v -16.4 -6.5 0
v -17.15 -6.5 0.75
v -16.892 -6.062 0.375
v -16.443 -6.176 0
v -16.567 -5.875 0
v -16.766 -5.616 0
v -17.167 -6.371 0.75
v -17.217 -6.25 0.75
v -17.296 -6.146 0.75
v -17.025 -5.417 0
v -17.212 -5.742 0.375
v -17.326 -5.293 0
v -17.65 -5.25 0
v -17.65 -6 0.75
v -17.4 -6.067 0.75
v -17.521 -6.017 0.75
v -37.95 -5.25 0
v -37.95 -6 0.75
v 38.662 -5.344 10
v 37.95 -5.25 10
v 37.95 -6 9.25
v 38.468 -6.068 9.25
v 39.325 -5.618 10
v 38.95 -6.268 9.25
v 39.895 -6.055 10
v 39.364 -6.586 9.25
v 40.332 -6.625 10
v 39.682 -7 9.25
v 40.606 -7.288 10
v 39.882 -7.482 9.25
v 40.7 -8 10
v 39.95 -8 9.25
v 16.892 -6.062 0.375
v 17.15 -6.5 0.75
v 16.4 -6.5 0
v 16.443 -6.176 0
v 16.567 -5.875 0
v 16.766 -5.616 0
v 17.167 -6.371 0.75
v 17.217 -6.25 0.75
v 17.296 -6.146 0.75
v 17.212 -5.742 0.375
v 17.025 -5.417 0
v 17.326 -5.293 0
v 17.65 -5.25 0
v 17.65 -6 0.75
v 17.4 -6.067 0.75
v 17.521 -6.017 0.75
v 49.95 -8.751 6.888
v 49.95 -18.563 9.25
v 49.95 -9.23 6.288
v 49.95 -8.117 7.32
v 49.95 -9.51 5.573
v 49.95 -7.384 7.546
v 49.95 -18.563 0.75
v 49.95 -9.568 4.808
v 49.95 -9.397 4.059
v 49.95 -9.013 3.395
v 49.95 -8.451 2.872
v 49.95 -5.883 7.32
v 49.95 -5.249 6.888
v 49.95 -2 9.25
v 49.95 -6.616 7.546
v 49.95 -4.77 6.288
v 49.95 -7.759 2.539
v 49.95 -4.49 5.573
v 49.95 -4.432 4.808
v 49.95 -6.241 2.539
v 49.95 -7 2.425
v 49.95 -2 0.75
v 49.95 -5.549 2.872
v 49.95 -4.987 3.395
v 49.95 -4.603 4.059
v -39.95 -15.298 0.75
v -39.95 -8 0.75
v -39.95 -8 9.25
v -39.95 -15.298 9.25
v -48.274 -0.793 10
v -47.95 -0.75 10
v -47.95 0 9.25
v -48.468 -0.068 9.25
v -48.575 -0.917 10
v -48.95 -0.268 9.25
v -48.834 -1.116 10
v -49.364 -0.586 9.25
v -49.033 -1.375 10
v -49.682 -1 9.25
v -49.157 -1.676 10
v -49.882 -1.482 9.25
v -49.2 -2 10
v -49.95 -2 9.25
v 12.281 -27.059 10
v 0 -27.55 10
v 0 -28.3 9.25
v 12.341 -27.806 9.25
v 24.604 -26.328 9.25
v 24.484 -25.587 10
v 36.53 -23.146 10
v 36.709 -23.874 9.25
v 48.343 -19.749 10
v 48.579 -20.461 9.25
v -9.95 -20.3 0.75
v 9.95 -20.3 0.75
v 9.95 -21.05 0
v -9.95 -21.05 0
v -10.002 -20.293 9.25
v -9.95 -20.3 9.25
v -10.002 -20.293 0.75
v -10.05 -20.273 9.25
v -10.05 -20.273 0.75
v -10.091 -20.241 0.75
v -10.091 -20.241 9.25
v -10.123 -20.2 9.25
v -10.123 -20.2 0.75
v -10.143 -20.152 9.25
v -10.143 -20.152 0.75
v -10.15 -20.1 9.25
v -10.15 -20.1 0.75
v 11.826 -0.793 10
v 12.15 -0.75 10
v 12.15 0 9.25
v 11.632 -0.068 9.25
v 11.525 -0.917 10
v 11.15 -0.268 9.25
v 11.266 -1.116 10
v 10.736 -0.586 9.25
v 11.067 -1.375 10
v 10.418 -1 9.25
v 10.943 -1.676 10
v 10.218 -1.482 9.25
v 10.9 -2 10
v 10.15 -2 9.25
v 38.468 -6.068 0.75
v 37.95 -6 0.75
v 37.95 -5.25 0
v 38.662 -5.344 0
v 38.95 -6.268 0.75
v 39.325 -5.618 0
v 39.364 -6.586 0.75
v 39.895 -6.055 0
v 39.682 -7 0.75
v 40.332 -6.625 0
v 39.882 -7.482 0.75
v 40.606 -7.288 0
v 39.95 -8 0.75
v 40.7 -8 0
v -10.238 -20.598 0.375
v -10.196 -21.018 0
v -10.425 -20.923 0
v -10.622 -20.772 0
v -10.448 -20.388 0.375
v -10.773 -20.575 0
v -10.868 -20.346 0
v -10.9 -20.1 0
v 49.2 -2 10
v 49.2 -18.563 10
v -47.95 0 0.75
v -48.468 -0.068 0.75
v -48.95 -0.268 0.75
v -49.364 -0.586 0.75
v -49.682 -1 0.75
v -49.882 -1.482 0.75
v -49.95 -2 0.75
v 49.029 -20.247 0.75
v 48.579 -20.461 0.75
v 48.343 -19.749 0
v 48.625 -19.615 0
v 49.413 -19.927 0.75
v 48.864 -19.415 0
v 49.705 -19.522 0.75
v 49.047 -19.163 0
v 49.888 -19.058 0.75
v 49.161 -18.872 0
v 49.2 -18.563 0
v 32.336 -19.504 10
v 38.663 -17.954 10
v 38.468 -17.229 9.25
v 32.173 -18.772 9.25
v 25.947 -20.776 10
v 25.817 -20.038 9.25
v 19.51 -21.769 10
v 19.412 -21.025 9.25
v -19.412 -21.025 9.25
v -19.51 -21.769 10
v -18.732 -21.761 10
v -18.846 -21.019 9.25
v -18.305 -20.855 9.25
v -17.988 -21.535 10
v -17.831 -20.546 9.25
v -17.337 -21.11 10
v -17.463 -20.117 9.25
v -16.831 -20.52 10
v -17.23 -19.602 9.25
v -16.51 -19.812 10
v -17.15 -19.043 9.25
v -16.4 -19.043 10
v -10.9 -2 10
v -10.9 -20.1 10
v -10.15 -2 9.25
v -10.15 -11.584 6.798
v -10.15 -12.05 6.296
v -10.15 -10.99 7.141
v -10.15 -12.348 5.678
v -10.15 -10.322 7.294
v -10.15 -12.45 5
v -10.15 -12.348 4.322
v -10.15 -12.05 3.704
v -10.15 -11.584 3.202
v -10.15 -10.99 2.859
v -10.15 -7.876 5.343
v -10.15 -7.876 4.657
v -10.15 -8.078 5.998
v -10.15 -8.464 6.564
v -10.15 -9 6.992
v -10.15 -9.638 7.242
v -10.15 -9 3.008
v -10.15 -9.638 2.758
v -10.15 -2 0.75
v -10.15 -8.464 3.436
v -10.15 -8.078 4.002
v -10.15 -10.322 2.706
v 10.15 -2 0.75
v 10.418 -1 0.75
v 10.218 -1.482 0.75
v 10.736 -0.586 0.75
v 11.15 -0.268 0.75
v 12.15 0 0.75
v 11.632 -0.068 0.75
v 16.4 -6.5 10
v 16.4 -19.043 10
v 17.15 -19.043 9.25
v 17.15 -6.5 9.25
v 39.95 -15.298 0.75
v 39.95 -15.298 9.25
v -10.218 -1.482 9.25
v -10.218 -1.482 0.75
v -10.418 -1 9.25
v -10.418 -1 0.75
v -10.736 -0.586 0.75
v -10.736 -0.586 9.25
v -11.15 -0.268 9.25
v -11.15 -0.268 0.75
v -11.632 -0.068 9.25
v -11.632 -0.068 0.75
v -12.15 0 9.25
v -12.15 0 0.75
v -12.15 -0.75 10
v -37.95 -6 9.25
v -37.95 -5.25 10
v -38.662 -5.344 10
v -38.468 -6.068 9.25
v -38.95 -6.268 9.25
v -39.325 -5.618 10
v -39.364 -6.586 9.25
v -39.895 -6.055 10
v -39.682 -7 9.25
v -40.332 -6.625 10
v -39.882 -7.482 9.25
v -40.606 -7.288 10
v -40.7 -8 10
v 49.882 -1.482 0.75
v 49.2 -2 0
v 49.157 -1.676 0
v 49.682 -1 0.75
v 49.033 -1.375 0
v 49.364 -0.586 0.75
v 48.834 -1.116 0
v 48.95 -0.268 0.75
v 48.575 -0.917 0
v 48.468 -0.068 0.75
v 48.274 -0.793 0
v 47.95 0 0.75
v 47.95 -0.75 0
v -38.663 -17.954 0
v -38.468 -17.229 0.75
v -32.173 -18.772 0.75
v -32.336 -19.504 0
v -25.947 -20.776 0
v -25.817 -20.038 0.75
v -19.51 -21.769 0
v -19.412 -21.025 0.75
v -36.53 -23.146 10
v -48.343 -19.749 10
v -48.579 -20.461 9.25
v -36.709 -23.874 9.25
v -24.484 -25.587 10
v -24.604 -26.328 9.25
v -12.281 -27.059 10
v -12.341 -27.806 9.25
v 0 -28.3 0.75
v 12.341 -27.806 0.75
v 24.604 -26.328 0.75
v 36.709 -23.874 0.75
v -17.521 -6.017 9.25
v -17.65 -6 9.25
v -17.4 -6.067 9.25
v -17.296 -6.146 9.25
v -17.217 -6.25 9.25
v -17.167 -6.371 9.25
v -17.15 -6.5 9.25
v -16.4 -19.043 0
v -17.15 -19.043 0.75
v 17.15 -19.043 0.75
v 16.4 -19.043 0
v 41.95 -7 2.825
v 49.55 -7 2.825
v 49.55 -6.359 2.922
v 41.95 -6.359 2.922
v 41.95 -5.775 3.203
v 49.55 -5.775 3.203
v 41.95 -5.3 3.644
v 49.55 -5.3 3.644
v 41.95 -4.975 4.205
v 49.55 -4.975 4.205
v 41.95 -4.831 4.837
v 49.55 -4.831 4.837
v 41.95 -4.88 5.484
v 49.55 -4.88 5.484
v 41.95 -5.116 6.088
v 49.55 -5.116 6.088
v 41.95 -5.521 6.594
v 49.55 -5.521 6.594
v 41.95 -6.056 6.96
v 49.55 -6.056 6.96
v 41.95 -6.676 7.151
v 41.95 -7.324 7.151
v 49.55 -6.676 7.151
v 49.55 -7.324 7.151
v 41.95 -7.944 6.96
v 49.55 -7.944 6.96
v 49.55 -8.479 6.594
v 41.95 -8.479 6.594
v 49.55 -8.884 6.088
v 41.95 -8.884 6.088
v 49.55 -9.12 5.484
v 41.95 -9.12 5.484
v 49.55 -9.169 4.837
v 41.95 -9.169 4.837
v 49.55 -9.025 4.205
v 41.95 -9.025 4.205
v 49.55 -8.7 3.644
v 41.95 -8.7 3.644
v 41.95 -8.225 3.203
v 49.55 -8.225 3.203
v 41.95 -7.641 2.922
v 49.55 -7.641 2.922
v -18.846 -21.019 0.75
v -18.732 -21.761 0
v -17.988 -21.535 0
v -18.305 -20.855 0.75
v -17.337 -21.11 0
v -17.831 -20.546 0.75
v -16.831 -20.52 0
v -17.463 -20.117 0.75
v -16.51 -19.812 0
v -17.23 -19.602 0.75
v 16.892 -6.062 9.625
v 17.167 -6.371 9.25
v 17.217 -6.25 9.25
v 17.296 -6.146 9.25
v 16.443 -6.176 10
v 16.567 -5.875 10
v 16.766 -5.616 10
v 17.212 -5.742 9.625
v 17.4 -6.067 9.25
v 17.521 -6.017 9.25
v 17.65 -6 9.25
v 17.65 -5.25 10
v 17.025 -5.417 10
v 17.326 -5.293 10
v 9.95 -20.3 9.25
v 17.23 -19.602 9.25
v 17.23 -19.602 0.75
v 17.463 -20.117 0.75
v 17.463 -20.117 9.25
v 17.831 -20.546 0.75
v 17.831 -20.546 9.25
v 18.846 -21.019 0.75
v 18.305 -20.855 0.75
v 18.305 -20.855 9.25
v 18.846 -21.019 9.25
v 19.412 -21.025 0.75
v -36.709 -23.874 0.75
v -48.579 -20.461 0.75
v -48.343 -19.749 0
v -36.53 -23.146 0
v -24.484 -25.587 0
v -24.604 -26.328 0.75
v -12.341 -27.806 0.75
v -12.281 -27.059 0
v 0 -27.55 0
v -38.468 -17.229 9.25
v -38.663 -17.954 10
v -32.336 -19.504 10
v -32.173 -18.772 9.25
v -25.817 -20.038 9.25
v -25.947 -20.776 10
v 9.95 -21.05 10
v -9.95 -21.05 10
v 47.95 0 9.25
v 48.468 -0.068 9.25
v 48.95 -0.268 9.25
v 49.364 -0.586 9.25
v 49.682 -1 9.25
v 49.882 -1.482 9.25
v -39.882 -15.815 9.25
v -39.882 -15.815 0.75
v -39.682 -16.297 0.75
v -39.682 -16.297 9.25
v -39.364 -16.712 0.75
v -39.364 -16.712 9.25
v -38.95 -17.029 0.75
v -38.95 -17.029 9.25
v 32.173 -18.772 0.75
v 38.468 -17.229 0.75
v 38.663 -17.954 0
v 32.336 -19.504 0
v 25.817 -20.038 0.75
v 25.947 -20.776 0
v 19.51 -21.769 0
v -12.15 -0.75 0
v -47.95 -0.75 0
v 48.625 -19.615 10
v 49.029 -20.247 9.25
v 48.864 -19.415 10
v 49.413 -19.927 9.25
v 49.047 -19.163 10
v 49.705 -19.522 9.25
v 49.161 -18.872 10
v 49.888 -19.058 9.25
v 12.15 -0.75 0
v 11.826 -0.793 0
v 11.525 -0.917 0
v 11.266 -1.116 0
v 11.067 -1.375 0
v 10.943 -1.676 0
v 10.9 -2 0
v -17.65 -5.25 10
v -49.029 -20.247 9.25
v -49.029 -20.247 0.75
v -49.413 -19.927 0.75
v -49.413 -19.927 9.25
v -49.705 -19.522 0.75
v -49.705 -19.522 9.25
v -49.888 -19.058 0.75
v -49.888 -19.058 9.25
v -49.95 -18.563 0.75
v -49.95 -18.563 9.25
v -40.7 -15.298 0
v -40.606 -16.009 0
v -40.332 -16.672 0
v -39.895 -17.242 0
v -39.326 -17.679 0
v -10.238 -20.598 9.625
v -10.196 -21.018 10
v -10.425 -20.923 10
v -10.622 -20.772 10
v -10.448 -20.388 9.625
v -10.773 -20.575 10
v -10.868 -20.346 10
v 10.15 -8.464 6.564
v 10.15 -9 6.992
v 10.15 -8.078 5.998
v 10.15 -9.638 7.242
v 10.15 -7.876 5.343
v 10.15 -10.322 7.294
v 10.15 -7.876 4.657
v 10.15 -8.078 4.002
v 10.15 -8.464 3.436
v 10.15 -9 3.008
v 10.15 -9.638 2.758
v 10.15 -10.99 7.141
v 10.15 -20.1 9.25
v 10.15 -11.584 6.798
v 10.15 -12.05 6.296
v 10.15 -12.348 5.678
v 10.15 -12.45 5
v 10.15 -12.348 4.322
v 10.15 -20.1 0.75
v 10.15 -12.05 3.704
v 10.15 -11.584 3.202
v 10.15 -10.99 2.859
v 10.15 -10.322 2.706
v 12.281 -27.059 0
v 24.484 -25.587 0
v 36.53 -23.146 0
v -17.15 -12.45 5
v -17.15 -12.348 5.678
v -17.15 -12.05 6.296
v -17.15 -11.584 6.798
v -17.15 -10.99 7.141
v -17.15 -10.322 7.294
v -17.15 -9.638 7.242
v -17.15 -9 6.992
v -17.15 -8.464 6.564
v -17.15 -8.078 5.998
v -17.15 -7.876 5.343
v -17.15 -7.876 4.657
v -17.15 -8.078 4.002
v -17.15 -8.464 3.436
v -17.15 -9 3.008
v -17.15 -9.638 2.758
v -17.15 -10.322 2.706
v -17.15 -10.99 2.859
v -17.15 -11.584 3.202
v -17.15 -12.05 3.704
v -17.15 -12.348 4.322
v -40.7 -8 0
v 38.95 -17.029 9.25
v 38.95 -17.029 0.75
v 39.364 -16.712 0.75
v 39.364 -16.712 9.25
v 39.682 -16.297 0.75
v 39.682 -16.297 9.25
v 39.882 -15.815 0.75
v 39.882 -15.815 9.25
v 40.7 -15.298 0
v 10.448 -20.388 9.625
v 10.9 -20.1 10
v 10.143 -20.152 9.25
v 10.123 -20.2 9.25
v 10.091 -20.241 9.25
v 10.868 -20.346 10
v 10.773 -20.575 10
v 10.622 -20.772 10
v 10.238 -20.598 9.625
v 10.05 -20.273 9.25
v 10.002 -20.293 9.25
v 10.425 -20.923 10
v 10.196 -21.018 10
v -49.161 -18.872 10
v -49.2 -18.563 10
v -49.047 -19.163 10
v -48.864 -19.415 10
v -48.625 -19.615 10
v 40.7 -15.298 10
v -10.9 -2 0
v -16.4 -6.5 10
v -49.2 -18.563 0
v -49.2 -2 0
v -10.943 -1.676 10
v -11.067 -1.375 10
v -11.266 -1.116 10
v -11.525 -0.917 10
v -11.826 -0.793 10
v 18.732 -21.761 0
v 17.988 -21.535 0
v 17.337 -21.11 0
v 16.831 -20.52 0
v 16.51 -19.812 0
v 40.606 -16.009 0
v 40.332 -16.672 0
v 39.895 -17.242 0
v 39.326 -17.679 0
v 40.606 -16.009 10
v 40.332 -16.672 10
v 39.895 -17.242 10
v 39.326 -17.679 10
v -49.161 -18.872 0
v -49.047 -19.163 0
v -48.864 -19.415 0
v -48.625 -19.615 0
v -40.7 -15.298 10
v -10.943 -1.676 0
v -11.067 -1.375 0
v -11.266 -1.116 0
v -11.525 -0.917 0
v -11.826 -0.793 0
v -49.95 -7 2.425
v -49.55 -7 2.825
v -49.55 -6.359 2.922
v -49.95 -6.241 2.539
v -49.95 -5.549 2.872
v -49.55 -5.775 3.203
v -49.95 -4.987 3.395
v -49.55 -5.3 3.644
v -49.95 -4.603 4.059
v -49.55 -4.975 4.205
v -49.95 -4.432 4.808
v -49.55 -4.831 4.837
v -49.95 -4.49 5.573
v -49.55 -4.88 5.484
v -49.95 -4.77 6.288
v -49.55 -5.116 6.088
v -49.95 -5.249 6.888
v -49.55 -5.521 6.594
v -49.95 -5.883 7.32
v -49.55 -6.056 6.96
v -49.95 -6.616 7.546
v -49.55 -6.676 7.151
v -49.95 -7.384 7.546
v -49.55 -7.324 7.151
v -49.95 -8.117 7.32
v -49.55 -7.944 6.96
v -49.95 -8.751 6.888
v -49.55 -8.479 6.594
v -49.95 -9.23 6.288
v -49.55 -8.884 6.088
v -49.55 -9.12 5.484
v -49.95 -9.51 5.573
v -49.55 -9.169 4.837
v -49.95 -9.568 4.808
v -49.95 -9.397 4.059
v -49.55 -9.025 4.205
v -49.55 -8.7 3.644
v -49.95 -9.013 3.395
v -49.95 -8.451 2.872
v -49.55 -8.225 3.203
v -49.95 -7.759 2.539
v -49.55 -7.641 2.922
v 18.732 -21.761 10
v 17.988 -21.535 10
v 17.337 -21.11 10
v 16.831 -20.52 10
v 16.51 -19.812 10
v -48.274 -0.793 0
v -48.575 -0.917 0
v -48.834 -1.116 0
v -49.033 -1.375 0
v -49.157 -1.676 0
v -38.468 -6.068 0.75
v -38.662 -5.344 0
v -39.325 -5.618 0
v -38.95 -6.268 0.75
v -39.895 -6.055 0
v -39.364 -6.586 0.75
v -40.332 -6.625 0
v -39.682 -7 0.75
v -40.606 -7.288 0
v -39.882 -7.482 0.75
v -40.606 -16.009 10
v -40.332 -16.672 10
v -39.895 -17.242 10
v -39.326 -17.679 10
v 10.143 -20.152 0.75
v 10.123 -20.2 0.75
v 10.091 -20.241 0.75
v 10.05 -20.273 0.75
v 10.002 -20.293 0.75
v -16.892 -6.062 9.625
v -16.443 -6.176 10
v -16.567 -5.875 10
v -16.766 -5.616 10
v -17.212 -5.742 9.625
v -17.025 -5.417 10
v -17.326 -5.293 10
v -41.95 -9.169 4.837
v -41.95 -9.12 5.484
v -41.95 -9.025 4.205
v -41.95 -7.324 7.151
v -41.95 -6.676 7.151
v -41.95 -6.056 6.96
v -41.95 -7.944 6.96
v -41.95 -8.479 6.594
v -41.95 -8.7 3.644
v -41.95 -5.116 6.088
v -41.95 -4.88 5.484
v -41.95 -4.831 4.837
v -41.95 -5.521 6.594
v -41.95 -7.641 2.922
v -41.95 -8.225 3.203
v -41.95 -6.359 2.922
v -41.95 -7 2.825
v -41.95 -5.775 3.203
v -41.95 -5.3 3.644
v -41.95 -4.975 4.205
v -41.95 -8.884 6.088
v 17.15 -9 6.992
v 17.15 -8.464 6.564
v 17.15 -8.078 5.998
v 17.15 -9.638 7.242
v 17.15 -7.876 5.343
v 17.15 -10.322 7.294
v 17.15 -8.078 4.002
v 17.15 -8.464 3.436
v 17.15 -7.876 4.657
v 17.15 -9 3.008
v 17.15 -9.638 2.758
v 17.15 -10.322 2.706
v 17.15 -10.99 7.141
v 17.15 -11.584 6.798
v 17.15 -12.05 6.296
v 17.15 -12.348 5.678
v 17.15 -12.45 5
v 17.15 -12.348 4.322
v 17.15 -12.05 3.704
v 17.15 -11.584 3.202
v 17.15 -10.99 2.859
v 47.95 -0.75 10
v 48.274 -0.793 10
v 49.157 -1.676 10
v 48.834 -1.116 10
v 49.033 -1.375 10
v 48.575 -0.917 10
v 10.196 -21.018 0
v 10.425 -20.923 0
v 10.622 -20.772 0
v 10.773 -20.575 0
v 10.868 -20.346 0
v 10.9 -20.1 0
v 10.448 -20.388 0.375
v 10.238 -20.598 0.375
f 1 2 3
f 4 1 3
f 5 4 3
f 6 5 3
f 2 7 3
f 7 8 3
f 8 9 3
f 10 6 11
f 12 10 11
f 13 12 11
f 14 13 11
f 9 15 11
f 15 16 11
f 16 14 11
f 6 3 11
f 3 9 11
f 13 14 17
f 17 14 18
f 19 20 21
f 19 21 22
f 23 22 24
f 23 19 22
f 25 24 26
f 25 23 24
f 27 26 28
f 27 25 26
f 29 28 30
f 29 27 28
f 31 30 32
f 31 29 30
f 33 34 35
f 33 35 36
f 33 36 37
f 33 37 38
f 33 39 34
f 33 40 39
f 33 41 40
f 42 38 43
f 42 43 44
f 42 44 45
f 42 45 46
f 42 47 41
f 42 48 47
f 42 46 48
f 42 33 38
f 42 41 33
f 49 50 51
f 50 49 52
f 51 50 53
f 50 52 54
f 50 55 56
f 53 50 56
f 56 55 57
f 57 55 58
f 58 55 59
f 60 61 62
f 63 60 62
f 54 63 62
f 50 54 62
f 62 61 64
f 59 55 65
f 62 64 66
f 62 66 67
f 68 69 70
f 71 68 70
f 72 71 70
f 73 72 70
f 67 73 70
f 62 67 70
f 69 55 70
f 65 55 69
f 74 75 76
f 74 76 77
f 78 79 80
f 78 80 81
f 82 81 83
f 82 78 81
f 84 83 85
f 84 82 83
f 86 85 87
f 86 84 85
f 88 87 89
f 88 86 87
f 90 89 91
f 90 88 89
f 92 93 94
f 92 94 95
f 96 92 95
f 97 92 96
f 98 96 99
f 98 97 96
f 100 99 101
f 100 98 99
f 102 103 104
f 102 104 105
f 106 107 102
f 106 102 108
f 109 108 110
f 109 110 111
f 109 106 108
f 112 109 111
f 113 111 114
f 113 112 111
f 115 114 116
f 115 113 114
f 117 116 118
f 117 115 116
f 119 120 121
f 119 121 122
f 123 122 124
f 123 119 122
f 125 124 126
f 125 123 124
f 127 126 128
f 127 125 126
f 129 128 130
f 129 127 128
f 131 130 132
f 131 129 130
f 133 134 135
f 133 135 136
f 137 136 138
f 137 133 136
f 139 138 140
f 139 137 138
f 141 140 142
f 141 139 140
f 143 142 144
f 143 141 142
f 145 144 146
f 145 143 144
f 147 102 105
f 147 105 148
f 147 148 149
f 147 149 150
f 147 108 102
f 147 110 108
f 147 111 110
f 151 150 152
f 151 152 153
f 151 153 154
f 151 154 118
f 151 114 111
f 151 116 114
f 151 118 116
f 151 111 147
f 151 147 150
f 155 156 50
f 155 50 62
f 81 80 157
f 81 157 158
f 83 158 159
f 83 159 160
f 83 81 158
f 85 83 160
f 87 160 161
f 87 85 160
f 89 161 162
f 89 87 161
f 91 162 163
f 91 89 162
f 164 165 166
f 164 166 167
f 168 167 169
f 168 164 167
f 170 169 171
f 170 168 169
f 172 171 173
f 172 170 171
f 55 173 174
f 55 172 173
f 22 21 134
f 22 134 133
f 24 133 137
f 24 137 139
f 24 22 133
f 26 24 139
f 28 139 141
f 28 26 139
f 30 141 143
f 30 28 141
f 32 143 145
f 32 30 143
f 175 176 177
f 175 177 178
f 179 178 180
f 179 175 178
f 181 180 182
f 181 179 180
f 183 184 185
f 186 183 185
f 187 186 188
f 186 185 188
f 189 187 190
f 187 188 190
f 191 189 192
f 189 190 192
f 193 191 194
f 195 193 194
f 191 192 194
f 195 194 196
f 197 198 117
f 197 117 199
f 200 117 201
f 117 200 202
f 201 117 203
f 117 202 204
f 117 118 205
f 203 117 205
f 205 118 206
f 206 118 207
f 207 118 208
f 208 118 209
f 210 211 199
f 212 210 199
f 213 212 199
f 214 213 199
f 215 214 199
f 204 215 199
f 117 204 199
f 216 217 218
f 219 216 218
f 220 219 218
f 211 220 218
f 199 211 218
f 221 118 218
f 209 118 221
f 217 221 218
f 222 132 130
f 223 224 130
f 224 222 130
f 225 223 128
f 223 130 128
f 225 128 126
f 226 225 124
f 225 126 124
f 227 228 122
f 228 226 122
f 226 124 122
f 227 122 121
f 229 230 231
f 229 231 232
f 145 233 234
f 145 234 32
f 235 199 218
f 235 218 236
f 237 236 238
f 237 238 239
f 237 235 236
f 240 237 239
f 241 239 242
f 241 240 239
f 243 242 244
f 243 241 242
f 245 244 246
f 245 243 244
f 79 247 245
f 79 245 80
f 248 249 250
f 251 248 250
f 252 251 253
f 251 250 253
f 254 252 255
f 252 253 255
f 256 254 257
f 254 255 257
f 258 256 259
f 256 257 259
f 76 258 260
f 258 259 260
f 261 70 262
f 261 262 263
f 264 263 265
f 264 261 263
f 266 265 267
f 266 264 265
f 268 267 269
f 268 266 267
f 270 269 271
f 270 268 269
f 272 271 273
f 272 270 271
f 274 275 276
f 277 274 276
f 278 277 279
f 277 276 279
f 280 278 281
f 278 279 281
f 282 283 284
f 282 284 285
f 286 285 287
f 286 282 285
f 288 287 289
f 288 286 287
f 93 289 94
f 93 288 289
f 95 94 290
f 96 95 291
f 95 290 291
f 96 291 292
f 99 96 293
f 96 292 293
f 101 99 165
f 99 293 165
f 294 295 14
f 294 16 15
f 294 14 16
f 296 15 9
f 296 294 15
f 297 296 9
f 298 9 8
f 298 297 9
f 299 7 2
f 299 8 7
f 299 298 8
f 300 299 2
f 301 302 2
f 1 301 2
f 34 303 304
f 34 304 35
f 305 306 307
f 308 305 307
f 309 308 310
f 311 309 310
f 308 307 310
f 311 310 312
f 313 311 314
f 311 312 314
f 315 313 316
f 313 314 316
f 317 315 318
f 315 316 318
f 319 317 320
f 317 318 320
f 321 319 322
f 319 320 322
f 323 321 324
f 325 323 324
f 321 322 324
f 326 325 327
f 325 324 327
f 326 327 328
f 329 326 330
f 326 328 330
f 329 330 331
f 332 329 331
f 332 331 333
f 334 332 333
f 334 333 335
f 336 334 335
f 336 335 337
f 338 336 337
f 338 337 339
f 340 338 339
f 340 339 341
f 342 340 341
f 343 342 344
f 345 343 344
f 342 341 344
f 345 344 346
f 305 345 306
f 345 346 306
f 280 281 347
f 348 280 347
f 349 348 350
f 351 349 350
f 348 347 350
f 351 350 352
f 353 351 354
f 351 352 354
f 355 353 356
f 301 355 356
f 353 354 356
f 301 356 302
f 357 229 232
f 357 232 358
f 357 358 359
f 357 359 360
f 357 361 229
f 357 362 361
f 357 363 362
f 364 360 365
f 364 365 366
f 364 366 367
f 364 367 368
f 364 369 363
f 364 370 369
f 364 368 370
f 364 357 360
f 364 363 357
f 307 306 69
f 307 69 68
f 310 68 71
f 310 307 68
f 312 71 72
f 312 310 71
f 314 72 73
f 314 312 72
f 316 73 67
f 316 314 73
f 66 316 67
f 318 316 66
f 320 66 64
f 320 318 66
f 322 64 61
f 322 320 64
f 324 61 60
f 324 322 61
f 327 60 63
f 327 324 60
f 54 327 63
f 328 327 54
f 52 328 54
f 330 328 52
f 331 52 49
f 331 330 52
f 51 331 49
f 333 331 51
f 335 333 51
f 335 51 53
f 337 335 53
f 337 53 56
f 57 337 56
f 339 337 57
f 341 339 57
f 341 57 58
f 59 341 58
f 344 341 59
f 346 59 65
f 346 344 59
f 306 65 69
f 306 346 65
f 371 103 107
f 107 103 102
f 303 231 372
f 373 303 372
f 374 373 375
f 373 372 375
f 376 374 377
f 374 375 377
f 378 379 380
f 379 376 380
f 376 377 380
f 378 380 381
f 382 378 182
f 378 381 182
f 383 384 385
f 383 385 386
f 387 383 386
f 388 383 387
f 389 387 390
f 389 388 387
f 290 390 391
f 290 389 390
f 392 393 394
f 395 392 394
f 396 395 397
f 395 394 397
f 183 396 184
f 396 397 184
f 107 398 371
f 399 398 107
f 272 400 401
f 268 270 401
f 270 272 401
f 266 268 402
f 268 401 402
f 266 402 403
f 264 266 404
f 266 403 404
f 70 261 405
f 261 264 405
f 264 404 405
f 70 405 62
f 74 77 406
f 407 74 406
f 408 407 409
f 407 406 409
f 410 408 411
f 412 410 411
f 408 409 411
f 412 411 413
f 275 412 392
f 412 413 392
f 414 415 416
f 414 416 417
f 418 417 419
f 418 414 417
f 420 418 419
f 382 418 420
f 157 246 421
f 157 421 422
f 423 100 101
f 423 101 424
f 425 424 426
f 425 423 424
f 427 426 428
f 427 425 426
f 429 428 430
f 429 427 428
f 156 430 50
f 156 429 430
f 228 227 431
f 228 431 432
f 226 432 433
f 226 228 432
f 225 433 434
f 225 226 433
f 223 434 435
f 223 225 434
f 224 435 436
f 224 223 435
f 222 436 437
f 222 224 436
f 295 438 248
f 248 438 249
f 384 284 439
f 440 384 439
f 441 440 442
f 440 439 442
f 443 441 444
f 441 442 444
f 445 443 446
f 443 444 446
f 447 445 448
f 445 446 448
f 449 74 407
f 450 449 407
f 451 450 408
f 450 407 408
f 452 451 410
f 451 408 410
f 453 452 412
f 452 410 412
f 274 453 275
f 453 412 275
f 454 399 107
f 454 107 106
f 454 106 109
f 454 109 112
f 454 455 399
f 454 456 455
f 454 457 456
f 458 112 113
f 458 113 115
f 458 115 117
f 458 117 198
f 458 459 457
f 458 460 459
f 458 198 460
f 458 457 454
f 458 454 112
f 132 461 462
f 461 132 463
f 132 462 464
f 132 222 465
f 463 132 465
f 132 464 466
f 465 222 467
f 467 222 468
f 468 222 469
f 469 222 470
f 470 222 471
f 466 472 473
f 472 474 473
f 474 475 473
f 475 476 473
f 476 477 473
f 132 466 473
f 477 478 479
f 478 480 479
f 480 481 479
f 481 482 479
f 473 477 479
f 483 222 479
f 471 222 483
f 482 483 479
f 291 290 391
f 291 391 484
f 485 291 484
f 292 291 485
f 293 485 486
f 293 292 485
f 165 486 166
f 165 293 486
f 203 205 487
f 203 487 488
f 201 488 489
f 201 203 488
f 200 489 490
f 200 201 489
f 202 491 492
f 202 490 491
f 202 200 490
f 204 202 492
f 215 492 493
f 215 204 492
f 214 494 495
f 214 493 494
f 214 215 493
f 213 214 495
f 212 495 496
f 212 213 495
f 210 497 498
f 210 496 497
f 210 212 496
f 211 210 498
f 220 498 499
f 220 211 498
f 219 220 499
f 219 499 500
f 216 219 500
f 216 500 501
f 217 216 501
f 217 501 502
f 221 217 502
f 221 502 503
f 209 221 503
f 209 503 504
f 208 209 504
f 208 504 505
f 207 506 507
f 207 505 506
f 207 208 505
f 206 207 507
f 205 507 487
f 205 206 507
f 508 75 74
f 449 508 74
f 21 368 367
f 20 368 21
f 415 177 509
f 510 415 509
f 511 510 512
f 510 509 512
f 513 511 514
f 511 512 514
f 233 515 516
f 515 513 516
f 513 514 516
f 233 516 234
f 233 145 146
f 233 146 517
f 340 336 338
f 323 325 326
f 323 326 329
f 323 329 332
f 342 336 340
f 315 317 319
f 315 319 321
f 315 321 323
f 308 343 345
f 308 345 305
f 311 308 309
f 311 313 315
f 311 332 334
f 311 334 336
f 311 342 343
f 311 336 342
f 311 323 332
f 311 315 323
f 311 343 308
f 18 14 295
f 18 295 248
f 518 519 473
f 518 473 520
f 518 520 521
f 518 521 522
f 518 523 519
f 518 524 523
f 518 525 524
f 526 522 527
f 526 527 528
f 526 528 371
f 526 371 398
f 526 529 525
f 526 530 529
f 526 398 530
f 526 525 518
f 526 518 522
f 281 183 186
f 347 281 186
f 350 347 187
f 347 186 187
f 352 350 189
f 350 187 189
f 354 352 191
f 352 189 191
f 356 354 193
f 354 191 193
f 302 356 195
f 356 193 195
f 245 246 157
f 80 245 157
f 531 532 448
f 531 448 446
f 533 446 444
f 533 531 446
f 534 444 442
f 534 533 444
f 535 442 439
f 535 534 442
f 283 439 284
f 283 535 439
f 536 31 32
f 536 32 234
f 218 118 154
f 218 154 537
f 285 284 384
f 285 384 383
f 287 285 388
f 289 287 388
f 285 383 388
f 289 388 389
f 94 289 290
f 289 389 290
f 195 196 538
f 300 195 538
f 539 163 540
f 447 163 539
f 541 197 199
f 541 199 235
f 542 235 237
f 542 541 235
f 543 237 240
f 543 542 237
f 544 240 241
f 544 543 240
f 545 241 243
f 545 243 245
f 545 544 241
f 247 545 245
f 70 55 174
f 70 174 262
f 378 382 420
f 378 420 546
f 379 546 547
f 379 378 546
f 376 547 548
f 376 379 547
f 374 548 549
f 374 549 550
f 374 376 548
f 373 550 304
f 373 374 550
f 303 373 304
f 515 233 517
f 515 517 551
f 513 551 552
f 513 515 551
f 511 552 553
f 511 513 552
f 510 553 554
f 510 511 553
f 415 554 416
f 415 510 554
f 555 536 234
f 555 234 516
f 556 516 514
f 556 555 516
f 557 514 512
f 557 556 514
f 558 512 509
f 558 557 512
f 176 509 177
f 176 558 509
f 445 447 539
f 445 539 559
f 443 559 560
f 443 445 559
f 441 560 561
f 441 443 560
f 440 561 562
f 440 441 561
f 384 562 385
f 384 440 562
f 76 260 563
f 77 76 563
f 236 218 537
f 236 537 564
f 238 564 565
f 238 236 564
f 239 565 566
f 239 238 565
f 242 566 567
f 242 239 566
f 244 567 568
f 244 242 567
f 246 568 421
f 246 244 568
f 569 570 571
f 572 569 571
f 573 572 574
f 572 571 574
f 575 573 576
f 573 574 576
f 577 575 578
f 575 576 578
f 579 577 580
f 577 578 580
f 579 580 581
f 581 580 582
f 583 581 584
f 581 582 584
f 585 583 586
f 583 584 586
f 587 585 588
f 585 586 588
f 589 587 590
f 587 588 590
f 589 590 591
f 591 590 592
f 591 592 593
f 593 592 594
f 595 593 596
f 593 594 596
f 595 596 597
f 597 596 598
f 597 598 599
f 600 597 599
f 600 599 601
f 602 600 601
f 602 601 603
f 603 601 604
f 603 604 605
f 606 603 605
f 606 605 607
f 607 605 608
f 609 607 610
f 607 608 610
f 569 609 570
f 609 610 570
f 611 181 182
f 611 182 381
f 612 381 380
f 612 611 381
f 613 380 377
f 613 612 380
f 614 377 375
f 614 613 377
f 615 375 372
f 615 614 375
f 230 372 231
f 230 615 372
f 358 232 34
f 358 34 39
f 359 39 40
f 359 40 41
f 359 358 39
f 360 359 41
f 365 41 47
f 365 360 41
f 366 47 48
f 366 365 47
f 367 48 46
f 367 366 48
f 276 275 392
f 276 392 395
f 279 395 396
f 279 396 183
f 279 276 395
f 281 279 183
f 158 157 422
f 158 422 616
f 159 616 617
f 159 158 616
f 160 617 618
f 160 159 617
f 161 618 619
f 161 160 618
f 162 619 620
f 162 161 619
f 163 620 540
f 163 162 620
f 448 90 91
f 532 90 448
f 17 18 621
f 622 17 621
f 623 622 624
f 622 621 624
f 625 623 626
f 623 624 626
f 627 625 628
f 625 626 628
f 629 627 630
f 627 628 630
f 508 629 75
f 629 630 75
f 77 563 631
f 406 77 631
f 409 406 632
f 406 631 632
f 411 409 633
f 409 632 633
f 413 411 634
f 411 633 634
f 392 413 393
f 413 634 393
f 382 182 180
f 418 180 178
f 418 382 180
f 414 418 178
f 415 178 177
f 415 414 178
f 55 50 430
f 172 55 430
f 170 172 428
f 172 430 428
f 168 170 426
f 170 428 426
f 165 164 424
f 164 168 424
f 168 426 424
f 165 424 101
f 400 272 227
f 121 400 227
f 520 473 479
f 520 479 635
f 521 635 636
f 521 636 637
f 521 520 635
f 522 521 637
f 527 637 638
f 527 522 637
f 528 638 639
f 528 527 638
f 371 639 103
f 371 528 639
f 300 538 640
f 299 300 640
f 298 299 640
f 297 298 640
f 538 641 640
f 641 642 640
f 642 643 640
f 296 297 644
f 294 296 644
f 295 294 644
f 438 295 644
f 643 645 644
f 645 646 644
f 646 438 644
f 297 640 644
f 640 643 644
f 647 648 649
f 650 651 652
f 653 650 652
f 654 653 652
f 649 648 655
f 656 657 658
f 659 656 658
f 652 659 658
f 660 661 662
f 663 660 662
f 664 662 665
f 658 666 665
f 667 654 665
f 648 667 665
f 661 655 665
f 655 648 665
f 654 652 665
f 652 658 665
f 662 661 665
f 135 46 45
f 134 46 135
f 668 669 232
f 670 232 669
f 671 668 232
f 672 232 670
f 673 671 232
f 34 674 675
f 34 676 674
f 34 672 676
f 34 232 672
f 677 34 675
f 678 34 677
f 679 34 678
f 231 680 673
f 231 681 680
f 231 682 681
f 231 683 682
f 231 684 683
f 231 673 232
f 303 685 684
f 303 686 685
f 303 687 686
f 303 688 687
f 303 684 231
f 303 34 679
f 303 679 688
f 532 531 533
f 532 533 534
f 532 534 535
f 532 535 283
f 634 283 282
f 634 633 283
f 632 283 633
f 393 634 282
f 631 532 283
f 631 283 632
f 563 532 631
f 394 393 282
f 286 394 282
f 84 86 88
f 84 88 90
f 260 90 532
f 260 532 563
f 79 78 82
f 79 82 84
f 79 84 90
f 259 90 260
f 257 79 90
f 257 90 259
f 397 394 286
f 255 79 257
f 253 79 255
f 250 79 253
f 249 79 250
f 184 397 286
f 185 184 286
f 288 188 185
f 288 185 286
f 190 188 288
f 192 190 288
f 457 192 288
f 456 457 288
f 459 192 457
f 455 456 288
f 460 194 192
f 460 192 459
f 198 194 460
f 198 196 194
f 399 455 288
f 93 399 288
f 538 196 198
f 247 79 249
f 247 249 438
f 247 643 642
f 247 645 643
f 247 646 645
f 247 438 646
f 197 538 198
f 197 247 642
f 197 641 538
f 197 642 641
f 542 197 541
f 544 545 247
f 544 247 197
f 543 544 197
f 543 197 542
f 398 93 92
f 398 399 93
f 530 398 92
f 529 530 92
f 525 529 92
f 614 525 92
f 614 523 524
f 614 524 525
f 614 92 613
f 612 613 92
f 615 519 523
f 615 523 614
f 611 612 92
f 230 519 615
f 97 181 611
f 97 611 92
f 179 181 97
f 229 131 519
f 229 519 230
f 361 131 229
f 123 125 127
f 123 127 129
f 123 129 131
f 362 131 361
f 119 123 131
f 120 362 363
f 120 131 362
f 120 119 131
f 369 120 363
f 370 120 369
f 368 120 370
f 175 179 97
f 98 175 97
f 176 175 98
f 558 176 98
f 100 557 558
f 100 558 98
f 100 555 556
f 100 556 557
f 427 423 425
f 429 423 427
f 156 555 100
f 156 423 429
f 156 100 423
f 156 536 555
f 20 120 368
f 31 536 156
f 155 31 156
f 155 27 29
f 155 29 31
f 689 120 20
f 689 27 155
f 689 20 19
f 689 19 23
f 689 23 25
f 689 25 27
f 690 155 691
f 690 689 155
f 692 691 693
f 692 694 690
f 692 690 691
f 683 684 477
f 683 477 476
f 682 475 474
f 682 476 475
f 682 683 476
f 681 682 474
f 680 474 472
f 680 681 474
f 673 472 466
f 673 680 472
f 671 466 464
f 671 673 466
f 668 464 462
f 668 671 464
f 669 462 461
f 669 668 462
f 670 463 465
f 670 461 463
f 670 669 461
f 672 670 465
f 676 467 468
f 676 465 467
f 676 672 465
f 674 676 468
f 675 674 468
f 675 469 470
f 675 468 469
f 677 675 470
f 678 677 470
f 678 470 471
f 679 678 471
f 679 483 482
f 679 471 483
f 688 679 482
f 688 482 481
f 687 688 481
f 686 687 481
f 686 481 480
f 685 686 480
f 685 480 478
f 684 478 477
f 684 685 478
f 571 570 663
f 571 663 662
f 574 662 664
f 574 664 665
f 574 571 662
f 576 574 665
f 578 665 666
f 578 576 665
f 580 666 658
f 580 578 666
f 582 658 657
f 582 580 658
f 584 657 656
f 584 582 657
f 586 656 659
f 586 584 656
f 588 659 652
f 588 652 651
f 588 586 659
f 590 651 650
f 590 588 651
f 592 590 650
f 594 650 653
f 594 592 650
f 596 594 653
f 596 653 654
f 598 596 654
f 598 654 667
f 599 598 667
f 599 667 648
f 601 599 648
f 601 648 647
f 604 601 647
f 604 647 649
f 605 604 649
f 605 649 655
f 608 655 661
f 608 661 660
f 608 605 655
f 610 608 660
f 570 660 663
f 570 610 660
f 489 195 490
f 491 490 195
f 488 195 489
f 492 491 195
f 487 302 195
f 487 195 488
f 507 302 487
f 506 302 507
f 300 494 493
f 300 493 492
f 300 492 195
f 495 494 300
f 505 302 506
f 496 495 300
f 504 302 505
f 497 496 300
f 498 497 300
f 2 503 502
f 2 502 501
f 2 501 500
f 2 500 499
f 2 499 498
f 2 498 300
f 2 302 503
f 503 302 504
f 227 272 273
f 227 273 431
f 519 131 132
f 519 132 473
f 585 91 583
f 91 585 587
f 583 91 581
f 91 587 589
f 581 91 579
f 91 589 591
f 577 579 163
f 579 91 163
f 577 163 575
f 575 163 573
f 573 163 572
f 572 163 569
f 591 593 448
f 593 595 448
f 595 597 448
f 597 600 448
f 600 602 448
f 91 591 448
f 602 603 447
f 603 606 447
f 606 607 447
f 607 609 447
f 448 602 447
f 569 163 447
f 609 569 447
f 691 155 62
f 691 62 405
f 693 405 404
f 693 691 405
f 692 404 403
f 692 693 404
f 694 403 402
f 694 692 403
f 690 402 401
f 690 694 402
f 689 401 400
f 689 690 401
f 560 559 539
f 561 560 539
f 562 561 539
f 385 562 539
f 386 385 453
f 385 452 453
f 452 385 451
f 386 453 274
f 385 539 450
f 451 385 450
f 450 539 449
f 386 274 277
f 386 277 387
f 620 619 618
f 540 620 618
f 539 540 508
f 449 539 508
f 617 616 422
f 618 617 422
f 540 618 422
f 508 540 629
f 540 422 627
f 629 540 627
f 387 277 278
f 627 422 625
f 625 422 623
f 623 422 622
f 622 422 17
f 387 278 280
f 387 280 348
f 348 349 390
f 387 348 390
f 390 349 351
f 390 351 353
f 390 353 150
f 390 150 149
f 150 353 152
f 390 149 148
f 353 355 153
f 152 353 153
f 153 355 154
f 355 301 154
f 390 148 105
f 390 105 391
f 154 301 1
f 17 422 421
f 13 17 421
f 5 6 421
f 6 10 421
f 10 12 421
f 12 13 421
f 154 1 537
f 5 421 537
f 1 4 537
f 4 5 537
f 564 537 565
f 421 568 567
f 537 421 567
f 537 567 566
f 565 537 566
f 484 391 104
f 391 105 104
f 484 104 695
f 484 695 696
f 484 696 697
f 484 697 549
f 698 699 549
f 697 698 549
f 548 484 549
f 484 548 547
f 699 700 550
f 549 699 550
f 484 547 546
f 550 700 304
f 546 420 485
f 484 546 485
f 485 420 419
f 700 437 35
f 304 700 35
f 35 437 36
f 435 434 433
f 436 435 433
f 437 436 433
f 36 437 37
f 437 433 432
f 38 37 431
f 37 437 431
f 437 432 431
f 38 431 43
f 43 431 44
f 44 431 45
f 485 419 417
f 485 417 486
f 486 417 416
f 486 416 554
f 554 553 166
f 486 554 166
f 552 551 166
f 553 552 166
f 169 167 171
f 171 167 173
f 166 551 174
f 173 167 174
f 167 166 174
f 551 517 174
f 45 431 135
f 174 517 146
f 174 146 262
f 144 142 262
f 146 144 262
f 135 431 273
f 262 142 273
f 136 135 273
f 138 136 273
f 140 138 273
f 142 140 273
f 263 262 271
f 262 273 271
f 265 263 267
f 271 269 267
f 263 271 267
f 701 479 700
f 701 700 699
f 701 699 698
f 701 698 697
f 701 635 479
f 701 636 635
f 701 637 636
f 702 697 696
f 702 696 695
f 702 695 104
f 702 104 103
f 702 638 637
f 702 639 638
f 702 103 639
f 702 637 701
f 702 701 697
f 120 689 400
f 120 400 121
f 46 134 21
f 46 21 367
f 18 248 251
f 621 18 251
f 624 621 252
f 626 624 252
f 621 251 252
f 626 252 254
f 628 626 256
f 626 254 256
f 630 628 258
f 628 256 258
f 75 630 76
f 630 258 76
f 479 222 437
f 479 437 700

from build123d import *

# Parameters (mm, degrees)
AUFSATZ_LINEAR_AUSTRAGEN1_DEPTH      = 10
SKIZZE2_R                            = 2.175
SCHNITT_LINEAR_AUSTRAGEN1_DEPTH      = 8
SCHNITT_LINEAR_AUSTRAGEN2_DEPTH      = 30
SCHNITT_LINEAR_AUSTRAGEN2_DEPTH_BACK = 10
SKIZZE3_R                            = 2.3
VERRUNDUNG1_R                        = 2
VERRUNDUNG2_R                        = 0.2
VERRUNDUNG3_R                        = 0.5
FASE1_SIZE                           = 0.75
FASE2_SIZE                           = 0.4


with BuildPart() as part:
    # Skizze1 → Aufsatz-Linear austragen1 (new body)
    with BuildSketch(Plane.XY):
        with BuildLine():
            Line((10.15, 0), (10.15, -20.3))
            Line((10.15, -20.3), (-10.15, -20.3))
            Line((-10.15, -20.3), (-10.15, 0))
            Line((-10.15, 0), (-49.95, 0))
            Line((-49.95, 0), (-49.95, -20))
            ThreePointArc((-49.95, -20), (-25.317447047, -26.210871087), (0, -28.3))
            ThreePointArc((0, -28.3), (25.317447047, -26.210871087), (49.95, -20))
            Line((49.95, -20), (49.95, 0))
            Line((49.95, 0), (10.15, 0))
        make_face()
        with BuildLine():
            Line((17.15, -6), (17.15, -21.30603648))
            ThreePointArc((17.15, -21.30603648), (28.637839253, -19.511539955), (39.95, -16.823476023))
            Line((39.95, -16.823476023), (39.95, -6))
            Line((39.95, -6), (17.15, -6))
        make_face(mode=Mode.SUBTRACT)
        with BuildLine():
            Line((-17.15, -6), (-39.95, -6))
            Line((-39.95, -6), (-39.95, -16.823476023))
            ThreePointArc((-39.95, -16.823476023), (-28.637839253, -19.511539955), (-17.15, -21.30603648))
            Line((-17.15, -21.30603648), (-17.15, -6))
        make_face(mode=Mode.SUBTRACT)
    extrude(amount=AUFSATZ_LINEAR_AUSTRAGEN1_DEPTH)

    # Skizze2 → Schnitt-Linear austragen1 (cut)
    with BuildSketch(Plane(origin=(49.95, 0, 0), x_dir=(0, 0, -1), z_dir=(1, 0, 0))):
        with Locations((-5, -7)):
            Circle(SKIZZE2_R)
    schnitt_linear_austragen1 = extrude(amount=-SCHNITT_LINEAR_AUSTRAGEN1_DEPTH, mode=Mode.SUBTRACT)

    # Spiegeln1: Schnitt-Linear austragen1 across plane
    add(schnitt_linear_austragen1.mirror(Plane(origin=(0, 0, 0), x_dir=(0, 0, 1), z_dir=(1, 0, 0))), mode=Mode.SUBTRACT)

    # Skizze3 → Schnitt-Linear austragen2 (cut, two sides: drawn at the far end of the back side and taken through both)
    with BuildSketch(Plane.ZY.offset(-10.15).offset(-SCHNITT_LINEAR_AUSTRAGEN2_DEPTH_BACK)):
        with Locations(Location((5, -10.15, 0), (0, 0, 270))):
            Circle(SKIZZE3_R)
    extrude(amount=SCHNITT_LINEAR_AUSTRAGEN2_DEPTH + SCHNITT_LINEAR_AUSTRAGEN2_DEPTH_BACK, mode=Mode.SUBTRACT)

    # Verrundung1
    verrundung1_edges = [part.edges().sort_by_distance(p)[0] for p in [
        (49.95, 0, 5),
        (49.95, -20, 5),
        (-49.95, -20, 5),
        (-49.95, 0, 5),
        (-10.15, 0, 5),
        (10.15, 0, 5),
        (39.95, -16.823476023, 5),
        (39.95, -6, 5),
        (17.15, -21.30603648, 5),
        (-17.15, -21.30603648, 5),
        (-39.95, -6, 5),
        (-39.95, -16.823476023, 5),
    ]]
    fillet(verrundung1_edges, radius=VERRUNDUNG1_R)

    # Verrundung2
    verrundung2_edges = [part.edges().sort_by_distance(p)[0] for p in [
        (-10.15, -20.3, 5),
        (10.15, -20.3, 5),
    ]]
    fillet(verrundung2_edges, radius=VERRUNDUNG2_R)

    # Verrundung3
    verrundung3_edges = [part.edges().sort_by_distance(p)[0] for p in [
        (17.15, -6, 5),
        (-17.15, -6, 5),
    ]]
    fillet(verrundung3_edges, radius=VERRUNDUNG3_R)

    # Fase1
    fase1_edges = [part.edges().sort_by_distance(p)[0] for p in [
        (-17.831485792, -20.546408723, 0),
        (-17.831485792, -20.546408723, 10),
        (-39.536902903, -16.514831798, 0),
        (-39.536902903, -16.514831798, 10),
        (-39.364213562, -6.585786438, 0),
        (-39.364213562, -6.585786438, 10),
        (39.364213562, -6.585786438, 0),
        (39.364213562, -6.585786438, 10),
        (39.536902903, -16.514831798, 0),
        (39.536902903, -16.514831798, 10),
        (17.831485792, -20.546408723, 0),
        (17.831485792, -20.546408723, 10),
        (-10.15, -11.05, 0),
        (-10.15, -11.05, 10),
        (0, -20.3, 0),
        (0, -20.3, 10),
        (-10.091421356, -20.241421356, 0),
        (-10.091421356, -20.241421356, 10),
        (10.091421356, -20.241421356, 0),
        (10.091421356, -20.241421356, 10),
        (-27.8, -6, 10),
        (-27.8, -6, 0),
        (17.15, -12.771286766, 10),
        (17.15, -12.771286766, 0),
        (-17.296446609, -6.146446609, 0),
        (-17.296446609, -6.146446609, 10),
        (17.296446609, -6.146446609, 0),
        (17.296446609, -6.146446609, 10),
        (30.05, 0, 0),
        (30.05, 0, 10),
        (49.95, -10.281445763, 0),
        (0, -28.3, 0),
        (-49.95, -10.281445763, 0),
        (-30.05, 0, 0),
        (10.15, -11.05, 0),
        (29.00206817, -19.439458054, 0),
        (39.95, -11.648782352, 0),
        (27.8, -6, 0),
        (-29.00206817, -19.439458054, 0),
        (-17.15, -12.771286766, 0),
        (-39.95, -11.648782352, 0),
        (49.571435511, -19.733765937, 0),
        (-49.571435511, -19.733765937, 0),
        (-49.364213562, -0.585786438, 0),
        (-10.735786438, -0.585786438, 0),
        (10.735786438, -0.585786438, 0),
        (49.364213562, -0.585786438, 0),
        (49.95, -10.281445763, 10),
        (39.95, -11.648782352, 10),
        (29.00206817, -19.439458054, 10),
        (27.8, -6, 10),
        (10.15, -11.05, 10),
        (-30.05, 0, 10),
        (-49.95, -10.281445763, 10),
        (0, -28.3, 10),
        (-17.15, -12.771286766, 10),
        (-29.00206817, -19.439458054, 10),
        (-39.95, -11.648782352, 10),
        (49.571435511, -19.733765937, 10),
        (-49.571435511, -19.733765937, 10),
        (-49.364213562, -0.585786438, 10),
        (-10.735786438, -0.585786438, 10),
        (10.735786438, -0.585786438, 10),
        (49.364213562, -0.585786438, 10),
    ]]
    chamfer(fase1_edges, length=FASE1_SIZE)

    # Fase2
    fase2_edges = [part.edges().sort_by_distance(p)[0] for p in [
        (49.95, -7, 7.175),
        (-49.95, -7, 7.175),
    ]]
    chamfer(fase2_edges, length=FASE2_SIZE)


solid = part.part
